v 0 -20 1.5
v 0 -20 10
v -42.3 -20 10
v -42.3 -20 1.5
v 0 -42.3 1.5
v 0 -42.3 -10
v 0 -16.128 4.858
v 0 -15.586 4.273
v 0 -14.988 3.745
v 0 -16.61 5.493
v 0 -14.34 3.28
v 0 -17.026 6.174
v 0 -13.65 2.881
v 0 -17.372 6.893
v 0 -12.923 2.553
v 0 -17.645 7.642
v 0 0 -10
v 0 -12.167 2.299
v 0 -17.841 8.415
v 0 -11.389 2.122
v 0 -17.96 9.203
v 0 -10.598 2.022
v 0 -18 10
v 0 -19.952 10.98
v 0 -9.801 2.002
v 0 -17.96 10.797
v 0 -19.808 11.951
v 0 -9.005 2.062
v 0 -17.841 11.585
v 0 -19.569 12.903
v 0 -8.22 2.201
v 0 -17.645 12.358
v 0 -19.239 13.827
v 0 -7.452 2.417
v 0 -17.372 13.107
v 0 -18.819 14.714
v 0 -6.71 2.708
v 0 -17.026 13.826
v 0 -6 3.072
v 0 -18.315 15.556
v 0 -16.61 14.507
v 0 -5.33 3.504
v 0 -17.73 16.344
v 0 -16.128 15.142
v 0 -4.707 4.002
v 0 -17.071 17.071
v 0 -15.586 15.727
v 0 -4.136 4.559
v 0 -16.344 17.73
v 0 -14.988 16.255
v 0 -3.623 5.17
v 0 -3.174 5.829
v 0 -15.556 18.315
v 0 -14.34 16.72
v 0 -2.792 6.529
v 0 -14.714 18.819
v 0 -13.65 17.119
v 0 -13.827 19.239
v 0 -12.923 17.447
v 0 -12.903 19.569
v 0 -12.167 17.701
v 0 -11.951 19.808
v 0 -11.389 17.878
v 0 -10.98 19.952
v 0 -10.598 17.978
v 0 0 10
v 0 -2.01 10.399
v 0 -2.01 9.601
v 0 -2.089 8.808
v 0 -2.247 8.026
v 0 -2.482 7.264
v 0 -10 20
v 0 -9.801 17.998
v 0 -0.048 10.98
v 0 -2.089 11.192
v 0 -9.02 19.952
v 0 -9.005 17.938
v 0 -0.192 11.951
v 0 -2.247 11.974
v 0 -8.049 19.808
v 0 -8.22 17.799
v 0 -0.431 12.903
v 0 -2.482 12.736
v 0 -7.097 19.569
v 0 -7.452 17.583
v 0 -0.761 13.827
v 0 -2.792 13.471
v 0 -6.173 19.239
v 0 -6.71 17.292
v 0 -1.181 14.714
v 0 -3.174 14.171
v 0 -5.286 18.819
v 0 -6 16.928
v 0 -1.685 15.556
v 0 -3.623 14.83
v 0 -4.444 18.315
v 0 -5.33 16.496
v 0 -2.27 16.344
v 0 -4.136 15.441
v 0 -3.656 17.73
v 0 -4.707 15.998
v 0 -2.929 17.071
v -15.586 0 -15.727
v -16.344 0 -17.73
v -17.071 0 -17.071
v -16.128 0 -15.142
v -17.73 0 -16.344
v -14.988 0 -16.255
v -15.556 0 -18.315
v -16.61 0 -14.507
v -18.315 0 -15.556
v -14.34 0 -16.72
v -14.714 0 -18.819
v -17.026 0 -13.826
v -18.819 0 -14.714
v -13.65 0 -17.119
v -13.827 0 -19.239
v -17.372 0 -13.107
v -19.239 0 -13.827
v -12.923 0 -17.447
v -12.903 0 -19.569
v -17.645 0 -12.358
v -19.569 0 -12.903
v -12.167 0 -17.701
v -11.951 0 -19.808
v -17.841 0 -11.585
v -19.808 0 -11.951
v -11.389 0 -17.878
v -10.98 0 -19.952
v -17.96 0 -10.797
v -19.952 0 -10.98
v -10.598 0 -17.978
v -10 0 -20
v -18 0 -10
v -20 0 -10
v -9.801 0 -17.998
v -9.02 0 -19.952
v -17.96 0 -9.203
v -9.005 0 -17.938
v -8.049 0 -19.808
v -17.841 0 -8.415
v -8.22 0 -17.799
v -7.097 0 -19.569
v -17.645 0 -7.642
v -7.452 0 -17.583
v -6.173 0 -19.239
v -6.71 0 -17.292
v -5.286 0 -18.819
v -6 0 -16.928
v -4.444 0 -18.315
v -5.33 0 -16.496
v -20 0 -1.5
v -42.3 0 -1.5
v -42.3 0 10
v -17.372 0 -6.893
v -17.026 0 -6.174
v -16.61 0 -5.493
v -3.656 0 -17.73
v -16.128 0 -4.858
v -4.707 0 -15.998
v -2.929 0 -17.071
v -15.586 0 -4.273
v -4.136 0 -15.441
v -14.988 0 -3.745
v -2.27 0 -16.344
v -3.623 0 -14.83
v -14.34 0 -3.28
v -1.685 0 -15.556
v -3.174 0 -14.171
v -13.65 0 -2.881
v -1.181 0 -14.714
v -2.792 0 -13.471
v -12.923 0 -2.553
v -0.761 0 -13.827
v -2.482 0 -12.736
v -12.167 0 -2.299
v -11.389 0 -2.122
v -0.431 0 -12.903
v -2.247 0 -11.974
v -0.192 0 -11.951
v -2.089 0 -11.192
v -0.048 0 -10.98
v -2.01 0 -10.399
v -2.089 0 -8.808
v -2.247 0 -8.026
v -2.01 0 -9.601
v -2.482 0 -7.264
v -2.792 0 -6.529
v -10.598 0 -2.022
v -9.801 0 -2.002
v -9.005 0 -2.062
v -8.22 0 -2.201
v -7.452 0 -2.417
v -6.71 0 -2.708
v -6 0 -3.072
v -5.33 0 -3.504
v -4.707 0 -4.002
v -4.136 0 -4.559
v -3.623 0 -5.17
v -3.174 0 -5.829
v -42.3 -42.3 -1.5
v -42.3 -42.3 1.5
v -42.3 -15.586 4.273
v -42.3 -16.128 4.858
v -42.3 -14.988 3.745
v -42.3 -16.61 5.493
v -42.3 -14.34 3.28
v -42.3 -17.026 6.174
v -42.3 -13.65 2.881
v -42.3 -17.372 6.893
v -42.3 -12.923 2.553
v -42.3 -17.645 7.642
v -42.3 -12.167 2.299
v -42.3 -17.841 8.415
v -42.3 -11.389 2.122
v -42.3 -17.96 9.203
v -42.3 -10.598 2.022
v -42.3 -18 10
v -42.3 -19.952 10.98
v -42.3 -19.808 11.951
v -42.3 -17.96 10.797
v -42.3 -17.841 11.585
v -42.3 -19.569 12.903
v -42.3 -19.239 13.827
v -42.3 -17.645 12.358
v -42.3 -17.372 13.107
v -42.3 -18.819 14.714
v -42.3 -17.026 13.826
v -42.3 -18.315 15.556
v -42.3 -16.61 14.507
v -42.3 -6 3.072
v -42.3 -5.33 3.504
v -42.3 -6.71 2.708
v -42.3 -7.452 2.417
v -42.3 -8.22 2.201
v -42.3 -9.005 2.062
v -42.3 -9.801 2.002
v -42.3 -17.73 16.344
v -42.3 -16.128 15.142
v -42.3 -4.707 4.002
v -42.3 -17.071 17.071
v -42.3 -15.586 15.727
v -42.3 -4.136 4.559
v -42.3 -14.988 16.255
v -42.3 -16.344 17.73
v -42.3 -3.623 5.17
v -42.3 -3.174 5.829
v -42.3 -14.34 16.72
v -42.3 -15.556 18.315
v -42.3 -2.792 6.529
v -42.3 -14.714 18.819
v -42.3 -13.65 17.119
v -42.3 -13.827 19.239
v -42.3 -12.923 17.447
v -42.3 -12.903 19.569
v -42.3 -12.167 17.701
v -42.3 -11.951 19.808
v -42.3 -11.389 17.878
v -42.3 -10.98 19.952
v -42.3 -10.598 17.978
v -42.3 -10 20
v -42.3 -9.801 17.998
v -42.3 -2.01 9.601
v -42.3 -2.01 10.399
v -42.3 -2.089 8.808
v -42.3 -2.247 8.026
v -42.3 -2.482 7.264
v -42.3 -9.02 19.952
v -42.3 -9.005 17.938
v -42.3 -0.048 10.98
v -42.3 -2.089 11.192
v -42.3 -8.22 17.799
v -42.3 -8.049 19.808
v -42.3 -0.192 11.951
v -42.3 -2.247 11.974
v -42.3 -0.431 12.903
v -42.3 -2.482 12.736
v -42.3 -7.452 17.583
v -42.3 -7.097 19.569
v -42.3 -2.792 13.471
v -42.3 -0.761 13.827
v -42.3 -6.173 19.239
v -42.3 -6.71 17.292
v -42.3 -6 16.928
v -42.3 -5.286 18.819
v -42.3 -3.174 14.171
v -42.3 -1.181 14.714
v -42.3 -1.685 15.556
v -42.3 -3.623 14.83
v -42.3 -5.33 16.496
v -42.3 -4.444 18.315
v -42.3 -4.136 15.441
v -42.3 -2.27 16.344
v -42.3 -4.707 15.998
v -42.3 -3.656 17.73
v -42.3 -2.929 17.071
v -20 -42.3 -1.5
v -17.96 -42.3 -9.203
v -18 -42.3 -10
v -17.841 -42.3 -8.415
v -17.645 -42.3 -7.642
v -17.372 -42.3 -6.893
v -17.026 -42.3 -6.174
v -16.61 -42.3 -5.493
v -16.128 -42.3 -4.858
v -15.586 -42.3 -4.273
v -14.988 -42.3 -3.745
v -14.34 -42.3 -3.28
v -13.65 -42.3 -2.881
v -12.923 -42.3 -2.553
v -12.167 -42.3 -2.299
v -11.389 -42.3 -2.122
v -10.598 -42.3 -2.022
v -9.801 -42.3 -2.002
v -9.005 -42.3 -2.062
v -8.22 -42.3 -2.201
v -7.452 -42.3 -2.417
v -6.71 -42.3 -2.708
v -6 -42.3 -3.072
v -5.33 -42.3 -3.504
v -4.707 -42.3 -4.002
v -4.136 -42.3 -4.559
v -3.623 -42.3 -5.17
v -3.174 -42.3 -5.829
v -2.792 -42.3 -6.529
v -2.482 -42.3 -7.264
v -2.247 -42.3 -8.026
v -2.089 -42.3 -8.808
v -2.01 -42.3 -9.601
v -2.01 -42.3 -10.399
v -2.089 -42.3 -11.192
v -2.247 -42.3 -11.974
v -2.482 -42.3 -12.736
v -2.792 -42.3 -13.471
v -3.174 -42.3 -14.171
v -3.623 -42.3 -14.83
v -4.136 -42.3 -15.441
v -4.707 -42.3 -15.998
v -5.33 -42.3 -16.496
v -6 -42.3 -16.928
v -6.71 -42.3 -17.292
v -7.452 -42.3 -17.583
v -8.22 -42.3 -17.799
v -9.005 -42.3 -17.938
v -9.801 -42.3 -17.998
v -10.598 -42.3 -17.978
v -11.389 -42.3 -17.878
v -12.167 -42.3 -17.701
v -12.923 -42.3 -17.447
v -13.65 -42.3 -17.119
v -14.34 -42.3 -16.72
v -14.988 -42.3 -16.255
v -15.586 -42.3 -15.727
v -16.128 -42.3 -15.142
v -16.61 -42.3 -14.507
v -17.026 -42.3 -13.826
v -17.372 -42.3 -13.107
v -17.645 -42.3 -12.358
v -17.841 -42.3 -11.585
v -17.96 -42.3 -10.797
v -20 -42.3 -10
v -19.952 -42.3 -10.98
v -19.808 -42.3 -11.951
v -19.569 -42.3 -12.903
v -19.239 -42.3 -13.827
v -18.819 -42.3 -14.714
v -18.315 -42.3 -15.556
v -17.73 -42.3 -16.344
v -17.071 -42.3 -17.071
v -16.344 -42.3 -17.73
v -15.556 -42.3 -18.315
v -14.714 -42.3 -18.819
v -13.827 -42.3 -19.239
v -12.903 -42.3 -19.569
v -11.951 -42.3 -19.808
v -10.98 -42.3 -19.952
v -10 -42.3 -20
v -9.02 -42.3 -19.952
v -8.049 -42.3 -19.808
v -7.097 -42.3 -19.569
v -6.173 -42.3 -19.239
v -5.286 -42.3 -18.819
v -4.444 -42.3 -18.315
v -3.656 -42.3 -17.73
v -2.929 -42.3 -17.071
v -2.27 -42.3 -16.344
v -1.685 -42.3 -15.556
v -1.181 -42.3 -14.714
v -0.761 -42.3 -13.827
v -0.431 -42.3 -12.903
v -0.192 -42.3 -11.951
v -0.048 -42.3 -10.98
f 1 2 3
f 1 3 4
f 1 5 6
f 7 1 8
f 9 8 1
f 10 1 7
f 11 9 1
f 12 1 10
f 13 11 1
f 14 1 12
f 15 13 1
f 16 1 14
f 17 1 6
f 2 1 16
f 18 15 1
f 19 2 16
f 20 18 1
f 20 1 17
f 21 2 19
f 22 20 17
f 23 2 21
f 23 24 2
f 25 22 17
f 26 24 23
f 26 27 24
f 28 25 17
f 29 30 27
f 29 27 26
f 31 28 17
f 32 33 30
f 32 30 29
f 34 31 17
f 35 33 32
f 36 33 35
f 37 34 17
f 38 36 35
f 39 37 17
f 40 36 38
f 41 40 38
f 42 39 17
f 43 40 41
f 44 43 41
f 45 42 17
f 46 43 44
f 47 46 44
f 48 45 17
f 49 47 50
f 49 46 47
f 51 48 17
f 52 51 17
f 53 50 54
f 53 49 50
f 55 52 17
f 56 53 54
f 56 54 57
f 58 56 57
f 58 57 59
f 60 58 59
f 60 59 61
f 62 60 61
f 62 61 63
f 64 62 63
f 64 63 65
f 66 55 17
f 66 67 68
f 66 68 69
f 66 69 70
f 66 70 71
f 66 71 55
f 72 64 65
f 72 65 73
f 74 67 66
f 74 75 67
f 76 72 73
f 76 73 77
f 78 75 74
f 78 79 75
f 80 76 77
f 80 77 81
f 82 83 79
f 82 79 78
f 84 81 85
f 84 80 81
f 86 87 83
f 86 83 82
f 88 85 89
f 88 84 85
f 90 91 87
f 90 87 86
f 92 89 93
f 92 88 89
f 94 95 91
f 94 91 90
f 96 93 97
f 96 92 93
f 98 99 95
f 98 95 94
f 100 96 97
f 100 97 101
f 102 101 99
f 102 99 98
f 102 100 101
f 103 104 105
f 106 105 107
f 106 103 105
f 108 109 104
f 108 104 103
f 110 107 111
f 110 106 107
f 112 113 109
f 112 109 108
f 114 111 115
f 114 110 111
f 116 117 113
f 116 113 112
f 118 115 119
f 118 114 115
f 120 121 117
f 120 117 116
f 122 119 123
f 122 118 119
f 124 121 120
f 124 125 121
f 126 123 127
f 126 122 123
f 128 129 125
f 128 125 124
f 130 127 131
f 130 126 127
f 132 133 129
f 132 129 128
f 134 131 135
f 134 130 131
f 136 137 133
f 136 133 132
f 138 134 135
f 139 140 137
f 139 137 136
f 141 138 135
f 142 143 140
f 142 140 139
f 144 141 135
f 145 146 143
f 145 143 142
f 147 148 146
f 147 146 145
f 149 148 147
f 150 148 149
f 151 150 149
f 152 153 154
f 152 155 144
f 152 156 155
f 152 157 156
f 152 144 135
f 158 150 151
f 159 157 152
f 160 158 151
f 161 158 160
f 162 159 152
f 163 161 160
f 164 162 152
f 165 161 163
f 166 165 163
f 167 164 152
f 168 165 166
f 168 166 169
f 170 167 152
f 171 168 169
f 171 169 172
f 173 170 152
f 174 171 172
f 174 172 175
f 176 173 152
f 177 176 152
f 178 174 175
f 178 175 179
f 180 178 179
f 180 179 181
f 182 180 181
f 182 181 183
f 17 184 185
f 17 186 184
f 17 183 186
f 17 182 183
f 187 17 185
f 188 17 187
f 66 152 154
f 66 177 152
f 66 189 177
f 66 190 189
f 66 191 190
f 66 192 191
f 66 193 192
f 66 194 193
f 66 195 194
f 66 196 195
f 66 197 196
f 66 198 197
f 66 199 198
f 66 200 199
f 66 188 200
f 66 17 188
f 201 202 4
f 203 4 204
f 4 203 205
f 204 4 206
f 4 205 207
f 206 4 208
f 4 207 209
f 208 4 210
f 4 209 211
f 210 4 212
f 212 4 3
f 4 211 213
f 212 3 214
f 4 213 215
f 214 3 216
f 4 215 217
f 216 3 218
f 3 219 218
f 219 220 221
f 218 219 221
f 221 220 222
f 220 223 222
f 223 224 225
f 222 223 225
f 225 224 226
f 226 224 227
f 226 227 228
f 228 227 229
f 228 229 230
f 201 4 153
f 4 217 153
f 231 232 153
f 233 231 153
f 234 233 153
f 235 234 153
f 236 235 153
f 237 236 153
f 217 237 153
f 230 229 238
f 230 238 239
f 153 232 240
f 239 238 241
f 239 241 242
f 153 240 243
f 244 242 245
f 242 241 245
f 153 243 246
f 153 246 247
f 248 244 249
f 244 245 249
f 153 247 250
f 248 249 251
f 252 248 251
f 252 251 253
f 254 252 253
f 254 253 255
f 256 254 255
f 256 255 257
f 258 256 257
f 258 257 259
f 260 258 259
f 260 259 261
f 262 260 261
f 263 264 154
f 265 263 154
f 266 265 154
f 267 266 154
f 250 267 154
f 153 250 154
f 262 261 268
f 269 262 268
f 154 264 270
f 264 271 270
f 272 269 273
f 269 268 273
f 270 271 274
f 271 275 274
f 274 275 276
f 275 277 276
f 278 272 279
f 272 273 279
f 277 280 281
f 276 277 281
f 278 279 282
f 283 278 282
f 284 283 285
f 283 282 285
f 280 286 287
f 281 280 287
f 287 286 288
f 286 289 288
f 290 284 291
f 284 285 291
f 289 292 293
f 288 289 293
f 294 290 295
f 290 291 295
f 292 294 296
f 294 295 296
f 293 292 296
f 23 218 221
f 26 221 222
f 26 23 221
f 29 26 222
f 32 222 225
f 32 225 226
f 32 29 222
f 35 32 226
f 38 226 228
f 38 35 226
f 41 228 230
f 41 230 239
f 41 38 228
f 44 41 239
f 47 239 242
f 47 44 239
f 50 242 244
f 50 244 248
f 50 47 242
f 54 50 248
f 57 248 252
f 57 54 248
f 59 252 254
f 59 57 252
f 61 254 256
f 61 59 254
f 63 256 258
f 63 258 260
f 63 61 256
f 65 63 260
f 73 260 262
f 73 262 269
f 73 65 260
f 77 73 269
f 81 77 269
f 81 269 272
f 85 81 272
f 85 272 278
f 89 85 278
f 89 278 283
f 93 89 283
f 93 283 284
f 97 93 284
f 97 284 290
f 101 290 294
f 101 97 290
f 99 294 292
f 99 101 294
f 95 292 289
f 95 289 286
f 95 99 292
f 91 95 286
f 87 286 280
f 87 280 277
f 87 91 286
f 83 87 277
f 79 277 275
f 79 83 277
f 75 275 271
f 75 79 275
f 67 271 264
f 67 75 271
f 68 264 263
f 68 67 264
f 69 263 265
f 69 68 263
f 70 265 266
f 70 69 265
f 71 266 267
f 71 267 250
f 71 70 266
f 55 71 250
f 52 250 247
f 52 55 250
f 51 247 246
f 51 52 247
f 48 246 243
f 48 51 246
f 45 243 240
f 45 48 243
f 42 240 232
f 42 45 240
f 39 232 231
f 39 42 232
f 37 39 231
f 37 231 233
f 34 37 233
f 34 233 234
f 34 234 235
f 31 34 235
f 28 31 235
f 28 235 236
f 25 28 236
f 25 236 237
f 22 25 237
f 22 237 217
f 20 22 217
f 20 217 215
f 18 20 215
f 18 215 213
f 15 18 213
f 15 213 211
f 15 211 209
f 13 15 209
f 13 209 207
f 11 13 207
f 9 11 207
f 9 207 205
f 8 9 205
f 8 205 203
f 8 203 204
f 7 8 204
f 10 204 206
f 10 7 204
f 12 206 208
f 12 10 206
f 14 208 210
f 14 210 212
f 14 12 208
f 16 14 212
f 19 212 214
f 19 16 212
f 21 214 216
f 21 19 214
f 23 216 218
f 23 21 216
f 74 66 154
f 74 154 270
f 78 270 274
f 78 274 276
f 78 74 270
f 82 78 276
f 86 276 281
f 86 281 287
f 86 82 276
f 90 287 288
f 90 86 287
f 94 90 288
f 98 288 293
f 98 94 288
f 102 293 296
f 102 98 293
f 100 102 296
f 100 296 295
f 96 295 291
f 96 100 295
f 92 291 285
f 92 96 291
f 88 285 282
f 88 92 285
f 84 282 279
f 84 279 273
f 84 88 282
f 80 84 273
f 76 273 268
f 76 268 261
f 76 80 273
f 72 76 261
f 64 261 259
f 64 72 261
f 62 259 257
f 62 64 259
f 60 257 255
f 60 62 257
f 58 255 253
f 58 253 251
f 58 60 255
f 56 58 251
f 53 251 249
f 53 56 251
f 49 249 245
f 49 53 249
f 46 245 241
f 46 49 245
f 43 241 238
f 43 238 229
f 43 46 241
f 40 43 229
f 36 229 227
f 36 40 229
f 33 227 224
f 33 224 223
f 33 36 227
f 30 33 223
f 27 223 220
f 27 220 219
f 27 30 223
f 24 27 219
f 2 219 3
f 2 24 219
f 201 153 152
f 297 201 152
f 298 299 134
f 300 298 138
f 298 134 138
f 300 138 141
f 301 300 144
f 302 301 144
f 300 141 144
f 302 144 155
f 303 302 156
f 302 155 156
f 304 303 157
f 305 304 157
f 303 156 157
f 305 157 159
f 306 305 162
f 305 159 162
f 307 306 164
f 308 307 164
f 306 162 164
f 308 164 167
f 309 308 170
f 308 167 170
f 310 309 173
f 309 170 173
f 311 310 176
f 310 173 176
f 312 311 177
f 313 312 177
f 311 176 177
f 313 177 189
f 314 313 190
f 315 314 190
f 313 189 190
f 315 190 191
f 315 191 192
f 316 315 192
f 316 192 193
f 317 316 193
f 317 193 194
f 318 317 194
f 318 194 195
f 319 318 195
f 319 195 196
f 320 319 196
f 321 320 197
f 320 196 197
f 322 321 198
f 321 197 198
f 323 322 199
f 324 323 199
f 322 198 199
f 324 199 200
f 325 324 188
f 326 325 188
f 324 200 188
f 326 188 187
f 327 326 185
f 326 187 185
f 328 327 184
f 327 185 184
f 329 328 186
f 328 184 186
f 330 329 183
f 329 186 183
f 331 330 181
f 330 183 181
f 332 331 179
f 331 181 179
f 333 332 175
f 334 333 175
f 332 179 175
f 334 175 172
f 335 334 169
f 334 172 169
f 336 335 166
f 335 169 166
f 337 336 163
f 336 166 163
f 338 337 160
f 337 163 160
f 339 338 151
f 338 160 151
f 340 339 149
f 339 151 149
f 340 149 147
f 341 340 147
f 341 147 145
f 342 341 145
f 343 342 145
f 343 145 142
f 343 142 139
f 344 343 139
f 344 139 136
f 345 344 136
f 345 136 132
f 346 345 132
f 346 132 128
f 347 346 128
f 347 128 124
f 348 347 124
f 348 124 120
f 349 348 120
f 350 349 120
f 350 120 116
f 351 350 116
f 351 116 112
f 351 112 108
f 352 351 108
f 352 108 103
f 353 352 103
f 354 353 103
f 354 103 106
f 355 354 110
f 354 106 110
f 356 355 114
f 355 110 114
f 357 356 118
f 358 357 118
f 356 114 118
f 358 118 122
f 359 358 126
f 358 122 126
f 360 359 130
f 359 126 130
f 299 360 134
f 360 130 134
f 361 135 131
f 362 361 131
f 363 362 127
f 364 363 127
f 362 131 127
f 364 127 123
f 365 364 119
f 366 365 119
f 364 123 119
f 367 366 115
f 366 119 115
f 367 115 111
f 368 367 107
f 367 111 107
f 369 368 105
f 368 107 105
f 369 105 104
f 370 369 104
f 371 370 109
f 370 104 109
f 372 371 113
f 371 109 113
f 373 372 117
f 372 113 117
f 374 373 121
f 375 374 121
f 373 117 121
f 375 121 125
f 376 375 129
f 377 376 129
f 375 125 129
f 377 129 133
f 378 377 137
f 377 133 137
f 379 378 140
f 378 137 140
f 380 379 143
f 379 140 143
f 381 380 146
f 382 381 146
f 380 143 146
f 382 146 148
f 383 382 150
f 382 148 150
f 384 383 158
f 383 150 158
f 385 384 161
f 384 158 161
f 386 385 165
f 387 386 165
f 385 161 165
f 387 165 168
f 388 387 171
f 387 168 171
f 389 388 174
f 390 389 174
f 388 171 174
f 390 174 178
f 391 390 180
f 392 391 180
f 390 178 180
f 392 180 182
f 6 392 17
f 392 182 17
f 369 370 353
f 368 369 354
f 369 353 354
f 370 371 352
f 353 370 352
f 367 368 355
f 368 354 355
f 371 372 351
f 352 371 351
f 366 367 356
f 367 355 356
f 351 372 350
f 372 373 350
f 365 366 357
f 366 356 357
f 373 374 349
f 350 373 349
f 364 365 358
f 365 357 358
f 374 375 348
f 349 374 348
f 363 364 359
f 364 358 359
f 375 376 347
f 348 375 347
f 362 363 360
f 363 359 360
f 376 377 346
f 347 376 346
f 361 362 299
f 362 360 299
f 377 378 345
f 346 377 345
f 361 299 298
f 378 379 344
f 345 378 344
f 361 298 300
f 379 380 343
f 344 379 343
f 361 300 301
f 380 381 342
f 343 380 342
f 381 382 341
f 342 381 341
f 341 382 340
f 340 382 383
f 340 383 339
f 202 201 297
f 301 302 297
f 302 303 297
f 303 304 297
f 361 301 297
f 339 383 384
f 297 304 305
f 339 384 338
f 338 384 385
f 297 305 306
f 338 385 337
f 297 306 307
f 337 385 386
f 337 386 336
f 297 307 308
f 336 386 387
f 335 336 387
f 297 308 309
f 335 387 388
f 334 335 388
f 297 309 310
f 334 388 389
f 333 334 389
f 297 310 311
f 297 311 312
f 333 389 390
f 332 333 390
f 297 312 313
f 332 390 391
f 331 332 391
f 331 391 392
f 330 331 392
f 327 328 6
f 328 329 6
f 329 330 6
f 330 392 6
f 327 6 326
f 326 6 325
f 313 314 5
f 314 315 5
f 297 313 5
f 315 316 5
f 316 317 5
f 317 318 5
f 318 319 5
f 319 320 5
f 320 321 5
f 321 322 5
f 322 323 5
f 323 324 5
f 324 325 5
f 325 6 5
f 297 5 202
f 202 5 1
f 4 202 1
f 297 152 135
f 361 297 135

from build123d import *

# Parameters (mm, degrees)
F0_W     = 22.3
F0_H     = 1.5
F1_DEPTH = 42.3
F2_W     = 22.3
F2_H     = 1.5
F3_DEPTH = 42.3


with BuildPart() as f1:
    # F0 (on Front) → F1 (new body)
    with BuildSketch(Plane.XZ):
        with BuildLine():
            Line((-18, -10), (-20, -10))
            ThreePointArc((-20, -10), (-10, -20), (0, -10))
            Line((0, -10), (-2, -10))
            ThreePointArc((-2, -10), (-10, -18), (-18, -10))
        make_face()
        with BuildLine():
            Line((-20, -1.5), (-20, -10))
            ThreePointArc((-20, -10), (-17.0710678119, -2.9289321881), (-10, 0))
            Line((-10, 0), (-20, 0))
            Line((-20, 0), (-20, -1.5))
        make_face()
        with BuildLine():
            ThreePointArc((-10, 0), (-17.0710678119, -2.9289321881), (-20, -10))
            Line((-20, -10), (-18, -10))
            ThreePointArc((-18, -10), (-10, -2), (-2, -10))
            Line((-2, -10), (0, -10))
            ThreePointArc((0, -10), (-2.9289321881, -2.9289321881), (-10, 0))
        make_face()
        with BuildLine():
            ThreePointArc((-10, 0), (-2.9289321881, -2.9289321881), (0, -10))
            Line((0, -10), (0, 0))
            Line((0, 0), (-10, 0))
        make_face()
        with Locations((-31.15, -0.75)):
            Rectangle(F0_W, F0_H)
    extrude(amount=F1_DEPTH)

    # F2 (on Right) → F3 (join)
    with BuildSketch(Plane.YZ):
        with BuildLine():
            Line((0, 10), (-2, 10))
            ThreePointArc((-2, 10), (-10, 2), (-18, 10))
            Line((-18, 10), (-20, 10))
            ThreePointArc((-20, 10), (-17.0710678119, 2.9289321881), (-10, 0))
            ThreePointArc((-10, 0), (-2.9289321881, 2.9289321881), (0, 10))
        make_face()
        with BuildLine():
            ThreePointArc((-18, 10), (-10, 18), (-2, 10))
            Line((-2, 10), (0, 10))
            ThreePointArc((0, 10), (-10, 20), (-20, 10))
            Line((-20, 10), (-18, 10))
        make_face()
        with BuildLine():
            Line((0, 0), (0, 10))
            ThreePointArc((0, 10), (-2.9289321881, 2.9289321881), (-10, 0))
            Line((-10, 0), (0, 0))
        make_face()
        with BuildLine():
            ThreePointArc((-10, 0), (-17.0710678119, 2.9289321881), (-20, 10))
            Line((-20, 10), (-20, 1.5))
            Line((-20, 1.5), (-20, 0))
            Line((-20, 0), (-10, 0))
        make_face()
        with Locations((-31.15, 0.75)):
            Rectangle(F2_W, F2_H)
    extrude(amount=-F3_DEPTH)


solid = f1.part
